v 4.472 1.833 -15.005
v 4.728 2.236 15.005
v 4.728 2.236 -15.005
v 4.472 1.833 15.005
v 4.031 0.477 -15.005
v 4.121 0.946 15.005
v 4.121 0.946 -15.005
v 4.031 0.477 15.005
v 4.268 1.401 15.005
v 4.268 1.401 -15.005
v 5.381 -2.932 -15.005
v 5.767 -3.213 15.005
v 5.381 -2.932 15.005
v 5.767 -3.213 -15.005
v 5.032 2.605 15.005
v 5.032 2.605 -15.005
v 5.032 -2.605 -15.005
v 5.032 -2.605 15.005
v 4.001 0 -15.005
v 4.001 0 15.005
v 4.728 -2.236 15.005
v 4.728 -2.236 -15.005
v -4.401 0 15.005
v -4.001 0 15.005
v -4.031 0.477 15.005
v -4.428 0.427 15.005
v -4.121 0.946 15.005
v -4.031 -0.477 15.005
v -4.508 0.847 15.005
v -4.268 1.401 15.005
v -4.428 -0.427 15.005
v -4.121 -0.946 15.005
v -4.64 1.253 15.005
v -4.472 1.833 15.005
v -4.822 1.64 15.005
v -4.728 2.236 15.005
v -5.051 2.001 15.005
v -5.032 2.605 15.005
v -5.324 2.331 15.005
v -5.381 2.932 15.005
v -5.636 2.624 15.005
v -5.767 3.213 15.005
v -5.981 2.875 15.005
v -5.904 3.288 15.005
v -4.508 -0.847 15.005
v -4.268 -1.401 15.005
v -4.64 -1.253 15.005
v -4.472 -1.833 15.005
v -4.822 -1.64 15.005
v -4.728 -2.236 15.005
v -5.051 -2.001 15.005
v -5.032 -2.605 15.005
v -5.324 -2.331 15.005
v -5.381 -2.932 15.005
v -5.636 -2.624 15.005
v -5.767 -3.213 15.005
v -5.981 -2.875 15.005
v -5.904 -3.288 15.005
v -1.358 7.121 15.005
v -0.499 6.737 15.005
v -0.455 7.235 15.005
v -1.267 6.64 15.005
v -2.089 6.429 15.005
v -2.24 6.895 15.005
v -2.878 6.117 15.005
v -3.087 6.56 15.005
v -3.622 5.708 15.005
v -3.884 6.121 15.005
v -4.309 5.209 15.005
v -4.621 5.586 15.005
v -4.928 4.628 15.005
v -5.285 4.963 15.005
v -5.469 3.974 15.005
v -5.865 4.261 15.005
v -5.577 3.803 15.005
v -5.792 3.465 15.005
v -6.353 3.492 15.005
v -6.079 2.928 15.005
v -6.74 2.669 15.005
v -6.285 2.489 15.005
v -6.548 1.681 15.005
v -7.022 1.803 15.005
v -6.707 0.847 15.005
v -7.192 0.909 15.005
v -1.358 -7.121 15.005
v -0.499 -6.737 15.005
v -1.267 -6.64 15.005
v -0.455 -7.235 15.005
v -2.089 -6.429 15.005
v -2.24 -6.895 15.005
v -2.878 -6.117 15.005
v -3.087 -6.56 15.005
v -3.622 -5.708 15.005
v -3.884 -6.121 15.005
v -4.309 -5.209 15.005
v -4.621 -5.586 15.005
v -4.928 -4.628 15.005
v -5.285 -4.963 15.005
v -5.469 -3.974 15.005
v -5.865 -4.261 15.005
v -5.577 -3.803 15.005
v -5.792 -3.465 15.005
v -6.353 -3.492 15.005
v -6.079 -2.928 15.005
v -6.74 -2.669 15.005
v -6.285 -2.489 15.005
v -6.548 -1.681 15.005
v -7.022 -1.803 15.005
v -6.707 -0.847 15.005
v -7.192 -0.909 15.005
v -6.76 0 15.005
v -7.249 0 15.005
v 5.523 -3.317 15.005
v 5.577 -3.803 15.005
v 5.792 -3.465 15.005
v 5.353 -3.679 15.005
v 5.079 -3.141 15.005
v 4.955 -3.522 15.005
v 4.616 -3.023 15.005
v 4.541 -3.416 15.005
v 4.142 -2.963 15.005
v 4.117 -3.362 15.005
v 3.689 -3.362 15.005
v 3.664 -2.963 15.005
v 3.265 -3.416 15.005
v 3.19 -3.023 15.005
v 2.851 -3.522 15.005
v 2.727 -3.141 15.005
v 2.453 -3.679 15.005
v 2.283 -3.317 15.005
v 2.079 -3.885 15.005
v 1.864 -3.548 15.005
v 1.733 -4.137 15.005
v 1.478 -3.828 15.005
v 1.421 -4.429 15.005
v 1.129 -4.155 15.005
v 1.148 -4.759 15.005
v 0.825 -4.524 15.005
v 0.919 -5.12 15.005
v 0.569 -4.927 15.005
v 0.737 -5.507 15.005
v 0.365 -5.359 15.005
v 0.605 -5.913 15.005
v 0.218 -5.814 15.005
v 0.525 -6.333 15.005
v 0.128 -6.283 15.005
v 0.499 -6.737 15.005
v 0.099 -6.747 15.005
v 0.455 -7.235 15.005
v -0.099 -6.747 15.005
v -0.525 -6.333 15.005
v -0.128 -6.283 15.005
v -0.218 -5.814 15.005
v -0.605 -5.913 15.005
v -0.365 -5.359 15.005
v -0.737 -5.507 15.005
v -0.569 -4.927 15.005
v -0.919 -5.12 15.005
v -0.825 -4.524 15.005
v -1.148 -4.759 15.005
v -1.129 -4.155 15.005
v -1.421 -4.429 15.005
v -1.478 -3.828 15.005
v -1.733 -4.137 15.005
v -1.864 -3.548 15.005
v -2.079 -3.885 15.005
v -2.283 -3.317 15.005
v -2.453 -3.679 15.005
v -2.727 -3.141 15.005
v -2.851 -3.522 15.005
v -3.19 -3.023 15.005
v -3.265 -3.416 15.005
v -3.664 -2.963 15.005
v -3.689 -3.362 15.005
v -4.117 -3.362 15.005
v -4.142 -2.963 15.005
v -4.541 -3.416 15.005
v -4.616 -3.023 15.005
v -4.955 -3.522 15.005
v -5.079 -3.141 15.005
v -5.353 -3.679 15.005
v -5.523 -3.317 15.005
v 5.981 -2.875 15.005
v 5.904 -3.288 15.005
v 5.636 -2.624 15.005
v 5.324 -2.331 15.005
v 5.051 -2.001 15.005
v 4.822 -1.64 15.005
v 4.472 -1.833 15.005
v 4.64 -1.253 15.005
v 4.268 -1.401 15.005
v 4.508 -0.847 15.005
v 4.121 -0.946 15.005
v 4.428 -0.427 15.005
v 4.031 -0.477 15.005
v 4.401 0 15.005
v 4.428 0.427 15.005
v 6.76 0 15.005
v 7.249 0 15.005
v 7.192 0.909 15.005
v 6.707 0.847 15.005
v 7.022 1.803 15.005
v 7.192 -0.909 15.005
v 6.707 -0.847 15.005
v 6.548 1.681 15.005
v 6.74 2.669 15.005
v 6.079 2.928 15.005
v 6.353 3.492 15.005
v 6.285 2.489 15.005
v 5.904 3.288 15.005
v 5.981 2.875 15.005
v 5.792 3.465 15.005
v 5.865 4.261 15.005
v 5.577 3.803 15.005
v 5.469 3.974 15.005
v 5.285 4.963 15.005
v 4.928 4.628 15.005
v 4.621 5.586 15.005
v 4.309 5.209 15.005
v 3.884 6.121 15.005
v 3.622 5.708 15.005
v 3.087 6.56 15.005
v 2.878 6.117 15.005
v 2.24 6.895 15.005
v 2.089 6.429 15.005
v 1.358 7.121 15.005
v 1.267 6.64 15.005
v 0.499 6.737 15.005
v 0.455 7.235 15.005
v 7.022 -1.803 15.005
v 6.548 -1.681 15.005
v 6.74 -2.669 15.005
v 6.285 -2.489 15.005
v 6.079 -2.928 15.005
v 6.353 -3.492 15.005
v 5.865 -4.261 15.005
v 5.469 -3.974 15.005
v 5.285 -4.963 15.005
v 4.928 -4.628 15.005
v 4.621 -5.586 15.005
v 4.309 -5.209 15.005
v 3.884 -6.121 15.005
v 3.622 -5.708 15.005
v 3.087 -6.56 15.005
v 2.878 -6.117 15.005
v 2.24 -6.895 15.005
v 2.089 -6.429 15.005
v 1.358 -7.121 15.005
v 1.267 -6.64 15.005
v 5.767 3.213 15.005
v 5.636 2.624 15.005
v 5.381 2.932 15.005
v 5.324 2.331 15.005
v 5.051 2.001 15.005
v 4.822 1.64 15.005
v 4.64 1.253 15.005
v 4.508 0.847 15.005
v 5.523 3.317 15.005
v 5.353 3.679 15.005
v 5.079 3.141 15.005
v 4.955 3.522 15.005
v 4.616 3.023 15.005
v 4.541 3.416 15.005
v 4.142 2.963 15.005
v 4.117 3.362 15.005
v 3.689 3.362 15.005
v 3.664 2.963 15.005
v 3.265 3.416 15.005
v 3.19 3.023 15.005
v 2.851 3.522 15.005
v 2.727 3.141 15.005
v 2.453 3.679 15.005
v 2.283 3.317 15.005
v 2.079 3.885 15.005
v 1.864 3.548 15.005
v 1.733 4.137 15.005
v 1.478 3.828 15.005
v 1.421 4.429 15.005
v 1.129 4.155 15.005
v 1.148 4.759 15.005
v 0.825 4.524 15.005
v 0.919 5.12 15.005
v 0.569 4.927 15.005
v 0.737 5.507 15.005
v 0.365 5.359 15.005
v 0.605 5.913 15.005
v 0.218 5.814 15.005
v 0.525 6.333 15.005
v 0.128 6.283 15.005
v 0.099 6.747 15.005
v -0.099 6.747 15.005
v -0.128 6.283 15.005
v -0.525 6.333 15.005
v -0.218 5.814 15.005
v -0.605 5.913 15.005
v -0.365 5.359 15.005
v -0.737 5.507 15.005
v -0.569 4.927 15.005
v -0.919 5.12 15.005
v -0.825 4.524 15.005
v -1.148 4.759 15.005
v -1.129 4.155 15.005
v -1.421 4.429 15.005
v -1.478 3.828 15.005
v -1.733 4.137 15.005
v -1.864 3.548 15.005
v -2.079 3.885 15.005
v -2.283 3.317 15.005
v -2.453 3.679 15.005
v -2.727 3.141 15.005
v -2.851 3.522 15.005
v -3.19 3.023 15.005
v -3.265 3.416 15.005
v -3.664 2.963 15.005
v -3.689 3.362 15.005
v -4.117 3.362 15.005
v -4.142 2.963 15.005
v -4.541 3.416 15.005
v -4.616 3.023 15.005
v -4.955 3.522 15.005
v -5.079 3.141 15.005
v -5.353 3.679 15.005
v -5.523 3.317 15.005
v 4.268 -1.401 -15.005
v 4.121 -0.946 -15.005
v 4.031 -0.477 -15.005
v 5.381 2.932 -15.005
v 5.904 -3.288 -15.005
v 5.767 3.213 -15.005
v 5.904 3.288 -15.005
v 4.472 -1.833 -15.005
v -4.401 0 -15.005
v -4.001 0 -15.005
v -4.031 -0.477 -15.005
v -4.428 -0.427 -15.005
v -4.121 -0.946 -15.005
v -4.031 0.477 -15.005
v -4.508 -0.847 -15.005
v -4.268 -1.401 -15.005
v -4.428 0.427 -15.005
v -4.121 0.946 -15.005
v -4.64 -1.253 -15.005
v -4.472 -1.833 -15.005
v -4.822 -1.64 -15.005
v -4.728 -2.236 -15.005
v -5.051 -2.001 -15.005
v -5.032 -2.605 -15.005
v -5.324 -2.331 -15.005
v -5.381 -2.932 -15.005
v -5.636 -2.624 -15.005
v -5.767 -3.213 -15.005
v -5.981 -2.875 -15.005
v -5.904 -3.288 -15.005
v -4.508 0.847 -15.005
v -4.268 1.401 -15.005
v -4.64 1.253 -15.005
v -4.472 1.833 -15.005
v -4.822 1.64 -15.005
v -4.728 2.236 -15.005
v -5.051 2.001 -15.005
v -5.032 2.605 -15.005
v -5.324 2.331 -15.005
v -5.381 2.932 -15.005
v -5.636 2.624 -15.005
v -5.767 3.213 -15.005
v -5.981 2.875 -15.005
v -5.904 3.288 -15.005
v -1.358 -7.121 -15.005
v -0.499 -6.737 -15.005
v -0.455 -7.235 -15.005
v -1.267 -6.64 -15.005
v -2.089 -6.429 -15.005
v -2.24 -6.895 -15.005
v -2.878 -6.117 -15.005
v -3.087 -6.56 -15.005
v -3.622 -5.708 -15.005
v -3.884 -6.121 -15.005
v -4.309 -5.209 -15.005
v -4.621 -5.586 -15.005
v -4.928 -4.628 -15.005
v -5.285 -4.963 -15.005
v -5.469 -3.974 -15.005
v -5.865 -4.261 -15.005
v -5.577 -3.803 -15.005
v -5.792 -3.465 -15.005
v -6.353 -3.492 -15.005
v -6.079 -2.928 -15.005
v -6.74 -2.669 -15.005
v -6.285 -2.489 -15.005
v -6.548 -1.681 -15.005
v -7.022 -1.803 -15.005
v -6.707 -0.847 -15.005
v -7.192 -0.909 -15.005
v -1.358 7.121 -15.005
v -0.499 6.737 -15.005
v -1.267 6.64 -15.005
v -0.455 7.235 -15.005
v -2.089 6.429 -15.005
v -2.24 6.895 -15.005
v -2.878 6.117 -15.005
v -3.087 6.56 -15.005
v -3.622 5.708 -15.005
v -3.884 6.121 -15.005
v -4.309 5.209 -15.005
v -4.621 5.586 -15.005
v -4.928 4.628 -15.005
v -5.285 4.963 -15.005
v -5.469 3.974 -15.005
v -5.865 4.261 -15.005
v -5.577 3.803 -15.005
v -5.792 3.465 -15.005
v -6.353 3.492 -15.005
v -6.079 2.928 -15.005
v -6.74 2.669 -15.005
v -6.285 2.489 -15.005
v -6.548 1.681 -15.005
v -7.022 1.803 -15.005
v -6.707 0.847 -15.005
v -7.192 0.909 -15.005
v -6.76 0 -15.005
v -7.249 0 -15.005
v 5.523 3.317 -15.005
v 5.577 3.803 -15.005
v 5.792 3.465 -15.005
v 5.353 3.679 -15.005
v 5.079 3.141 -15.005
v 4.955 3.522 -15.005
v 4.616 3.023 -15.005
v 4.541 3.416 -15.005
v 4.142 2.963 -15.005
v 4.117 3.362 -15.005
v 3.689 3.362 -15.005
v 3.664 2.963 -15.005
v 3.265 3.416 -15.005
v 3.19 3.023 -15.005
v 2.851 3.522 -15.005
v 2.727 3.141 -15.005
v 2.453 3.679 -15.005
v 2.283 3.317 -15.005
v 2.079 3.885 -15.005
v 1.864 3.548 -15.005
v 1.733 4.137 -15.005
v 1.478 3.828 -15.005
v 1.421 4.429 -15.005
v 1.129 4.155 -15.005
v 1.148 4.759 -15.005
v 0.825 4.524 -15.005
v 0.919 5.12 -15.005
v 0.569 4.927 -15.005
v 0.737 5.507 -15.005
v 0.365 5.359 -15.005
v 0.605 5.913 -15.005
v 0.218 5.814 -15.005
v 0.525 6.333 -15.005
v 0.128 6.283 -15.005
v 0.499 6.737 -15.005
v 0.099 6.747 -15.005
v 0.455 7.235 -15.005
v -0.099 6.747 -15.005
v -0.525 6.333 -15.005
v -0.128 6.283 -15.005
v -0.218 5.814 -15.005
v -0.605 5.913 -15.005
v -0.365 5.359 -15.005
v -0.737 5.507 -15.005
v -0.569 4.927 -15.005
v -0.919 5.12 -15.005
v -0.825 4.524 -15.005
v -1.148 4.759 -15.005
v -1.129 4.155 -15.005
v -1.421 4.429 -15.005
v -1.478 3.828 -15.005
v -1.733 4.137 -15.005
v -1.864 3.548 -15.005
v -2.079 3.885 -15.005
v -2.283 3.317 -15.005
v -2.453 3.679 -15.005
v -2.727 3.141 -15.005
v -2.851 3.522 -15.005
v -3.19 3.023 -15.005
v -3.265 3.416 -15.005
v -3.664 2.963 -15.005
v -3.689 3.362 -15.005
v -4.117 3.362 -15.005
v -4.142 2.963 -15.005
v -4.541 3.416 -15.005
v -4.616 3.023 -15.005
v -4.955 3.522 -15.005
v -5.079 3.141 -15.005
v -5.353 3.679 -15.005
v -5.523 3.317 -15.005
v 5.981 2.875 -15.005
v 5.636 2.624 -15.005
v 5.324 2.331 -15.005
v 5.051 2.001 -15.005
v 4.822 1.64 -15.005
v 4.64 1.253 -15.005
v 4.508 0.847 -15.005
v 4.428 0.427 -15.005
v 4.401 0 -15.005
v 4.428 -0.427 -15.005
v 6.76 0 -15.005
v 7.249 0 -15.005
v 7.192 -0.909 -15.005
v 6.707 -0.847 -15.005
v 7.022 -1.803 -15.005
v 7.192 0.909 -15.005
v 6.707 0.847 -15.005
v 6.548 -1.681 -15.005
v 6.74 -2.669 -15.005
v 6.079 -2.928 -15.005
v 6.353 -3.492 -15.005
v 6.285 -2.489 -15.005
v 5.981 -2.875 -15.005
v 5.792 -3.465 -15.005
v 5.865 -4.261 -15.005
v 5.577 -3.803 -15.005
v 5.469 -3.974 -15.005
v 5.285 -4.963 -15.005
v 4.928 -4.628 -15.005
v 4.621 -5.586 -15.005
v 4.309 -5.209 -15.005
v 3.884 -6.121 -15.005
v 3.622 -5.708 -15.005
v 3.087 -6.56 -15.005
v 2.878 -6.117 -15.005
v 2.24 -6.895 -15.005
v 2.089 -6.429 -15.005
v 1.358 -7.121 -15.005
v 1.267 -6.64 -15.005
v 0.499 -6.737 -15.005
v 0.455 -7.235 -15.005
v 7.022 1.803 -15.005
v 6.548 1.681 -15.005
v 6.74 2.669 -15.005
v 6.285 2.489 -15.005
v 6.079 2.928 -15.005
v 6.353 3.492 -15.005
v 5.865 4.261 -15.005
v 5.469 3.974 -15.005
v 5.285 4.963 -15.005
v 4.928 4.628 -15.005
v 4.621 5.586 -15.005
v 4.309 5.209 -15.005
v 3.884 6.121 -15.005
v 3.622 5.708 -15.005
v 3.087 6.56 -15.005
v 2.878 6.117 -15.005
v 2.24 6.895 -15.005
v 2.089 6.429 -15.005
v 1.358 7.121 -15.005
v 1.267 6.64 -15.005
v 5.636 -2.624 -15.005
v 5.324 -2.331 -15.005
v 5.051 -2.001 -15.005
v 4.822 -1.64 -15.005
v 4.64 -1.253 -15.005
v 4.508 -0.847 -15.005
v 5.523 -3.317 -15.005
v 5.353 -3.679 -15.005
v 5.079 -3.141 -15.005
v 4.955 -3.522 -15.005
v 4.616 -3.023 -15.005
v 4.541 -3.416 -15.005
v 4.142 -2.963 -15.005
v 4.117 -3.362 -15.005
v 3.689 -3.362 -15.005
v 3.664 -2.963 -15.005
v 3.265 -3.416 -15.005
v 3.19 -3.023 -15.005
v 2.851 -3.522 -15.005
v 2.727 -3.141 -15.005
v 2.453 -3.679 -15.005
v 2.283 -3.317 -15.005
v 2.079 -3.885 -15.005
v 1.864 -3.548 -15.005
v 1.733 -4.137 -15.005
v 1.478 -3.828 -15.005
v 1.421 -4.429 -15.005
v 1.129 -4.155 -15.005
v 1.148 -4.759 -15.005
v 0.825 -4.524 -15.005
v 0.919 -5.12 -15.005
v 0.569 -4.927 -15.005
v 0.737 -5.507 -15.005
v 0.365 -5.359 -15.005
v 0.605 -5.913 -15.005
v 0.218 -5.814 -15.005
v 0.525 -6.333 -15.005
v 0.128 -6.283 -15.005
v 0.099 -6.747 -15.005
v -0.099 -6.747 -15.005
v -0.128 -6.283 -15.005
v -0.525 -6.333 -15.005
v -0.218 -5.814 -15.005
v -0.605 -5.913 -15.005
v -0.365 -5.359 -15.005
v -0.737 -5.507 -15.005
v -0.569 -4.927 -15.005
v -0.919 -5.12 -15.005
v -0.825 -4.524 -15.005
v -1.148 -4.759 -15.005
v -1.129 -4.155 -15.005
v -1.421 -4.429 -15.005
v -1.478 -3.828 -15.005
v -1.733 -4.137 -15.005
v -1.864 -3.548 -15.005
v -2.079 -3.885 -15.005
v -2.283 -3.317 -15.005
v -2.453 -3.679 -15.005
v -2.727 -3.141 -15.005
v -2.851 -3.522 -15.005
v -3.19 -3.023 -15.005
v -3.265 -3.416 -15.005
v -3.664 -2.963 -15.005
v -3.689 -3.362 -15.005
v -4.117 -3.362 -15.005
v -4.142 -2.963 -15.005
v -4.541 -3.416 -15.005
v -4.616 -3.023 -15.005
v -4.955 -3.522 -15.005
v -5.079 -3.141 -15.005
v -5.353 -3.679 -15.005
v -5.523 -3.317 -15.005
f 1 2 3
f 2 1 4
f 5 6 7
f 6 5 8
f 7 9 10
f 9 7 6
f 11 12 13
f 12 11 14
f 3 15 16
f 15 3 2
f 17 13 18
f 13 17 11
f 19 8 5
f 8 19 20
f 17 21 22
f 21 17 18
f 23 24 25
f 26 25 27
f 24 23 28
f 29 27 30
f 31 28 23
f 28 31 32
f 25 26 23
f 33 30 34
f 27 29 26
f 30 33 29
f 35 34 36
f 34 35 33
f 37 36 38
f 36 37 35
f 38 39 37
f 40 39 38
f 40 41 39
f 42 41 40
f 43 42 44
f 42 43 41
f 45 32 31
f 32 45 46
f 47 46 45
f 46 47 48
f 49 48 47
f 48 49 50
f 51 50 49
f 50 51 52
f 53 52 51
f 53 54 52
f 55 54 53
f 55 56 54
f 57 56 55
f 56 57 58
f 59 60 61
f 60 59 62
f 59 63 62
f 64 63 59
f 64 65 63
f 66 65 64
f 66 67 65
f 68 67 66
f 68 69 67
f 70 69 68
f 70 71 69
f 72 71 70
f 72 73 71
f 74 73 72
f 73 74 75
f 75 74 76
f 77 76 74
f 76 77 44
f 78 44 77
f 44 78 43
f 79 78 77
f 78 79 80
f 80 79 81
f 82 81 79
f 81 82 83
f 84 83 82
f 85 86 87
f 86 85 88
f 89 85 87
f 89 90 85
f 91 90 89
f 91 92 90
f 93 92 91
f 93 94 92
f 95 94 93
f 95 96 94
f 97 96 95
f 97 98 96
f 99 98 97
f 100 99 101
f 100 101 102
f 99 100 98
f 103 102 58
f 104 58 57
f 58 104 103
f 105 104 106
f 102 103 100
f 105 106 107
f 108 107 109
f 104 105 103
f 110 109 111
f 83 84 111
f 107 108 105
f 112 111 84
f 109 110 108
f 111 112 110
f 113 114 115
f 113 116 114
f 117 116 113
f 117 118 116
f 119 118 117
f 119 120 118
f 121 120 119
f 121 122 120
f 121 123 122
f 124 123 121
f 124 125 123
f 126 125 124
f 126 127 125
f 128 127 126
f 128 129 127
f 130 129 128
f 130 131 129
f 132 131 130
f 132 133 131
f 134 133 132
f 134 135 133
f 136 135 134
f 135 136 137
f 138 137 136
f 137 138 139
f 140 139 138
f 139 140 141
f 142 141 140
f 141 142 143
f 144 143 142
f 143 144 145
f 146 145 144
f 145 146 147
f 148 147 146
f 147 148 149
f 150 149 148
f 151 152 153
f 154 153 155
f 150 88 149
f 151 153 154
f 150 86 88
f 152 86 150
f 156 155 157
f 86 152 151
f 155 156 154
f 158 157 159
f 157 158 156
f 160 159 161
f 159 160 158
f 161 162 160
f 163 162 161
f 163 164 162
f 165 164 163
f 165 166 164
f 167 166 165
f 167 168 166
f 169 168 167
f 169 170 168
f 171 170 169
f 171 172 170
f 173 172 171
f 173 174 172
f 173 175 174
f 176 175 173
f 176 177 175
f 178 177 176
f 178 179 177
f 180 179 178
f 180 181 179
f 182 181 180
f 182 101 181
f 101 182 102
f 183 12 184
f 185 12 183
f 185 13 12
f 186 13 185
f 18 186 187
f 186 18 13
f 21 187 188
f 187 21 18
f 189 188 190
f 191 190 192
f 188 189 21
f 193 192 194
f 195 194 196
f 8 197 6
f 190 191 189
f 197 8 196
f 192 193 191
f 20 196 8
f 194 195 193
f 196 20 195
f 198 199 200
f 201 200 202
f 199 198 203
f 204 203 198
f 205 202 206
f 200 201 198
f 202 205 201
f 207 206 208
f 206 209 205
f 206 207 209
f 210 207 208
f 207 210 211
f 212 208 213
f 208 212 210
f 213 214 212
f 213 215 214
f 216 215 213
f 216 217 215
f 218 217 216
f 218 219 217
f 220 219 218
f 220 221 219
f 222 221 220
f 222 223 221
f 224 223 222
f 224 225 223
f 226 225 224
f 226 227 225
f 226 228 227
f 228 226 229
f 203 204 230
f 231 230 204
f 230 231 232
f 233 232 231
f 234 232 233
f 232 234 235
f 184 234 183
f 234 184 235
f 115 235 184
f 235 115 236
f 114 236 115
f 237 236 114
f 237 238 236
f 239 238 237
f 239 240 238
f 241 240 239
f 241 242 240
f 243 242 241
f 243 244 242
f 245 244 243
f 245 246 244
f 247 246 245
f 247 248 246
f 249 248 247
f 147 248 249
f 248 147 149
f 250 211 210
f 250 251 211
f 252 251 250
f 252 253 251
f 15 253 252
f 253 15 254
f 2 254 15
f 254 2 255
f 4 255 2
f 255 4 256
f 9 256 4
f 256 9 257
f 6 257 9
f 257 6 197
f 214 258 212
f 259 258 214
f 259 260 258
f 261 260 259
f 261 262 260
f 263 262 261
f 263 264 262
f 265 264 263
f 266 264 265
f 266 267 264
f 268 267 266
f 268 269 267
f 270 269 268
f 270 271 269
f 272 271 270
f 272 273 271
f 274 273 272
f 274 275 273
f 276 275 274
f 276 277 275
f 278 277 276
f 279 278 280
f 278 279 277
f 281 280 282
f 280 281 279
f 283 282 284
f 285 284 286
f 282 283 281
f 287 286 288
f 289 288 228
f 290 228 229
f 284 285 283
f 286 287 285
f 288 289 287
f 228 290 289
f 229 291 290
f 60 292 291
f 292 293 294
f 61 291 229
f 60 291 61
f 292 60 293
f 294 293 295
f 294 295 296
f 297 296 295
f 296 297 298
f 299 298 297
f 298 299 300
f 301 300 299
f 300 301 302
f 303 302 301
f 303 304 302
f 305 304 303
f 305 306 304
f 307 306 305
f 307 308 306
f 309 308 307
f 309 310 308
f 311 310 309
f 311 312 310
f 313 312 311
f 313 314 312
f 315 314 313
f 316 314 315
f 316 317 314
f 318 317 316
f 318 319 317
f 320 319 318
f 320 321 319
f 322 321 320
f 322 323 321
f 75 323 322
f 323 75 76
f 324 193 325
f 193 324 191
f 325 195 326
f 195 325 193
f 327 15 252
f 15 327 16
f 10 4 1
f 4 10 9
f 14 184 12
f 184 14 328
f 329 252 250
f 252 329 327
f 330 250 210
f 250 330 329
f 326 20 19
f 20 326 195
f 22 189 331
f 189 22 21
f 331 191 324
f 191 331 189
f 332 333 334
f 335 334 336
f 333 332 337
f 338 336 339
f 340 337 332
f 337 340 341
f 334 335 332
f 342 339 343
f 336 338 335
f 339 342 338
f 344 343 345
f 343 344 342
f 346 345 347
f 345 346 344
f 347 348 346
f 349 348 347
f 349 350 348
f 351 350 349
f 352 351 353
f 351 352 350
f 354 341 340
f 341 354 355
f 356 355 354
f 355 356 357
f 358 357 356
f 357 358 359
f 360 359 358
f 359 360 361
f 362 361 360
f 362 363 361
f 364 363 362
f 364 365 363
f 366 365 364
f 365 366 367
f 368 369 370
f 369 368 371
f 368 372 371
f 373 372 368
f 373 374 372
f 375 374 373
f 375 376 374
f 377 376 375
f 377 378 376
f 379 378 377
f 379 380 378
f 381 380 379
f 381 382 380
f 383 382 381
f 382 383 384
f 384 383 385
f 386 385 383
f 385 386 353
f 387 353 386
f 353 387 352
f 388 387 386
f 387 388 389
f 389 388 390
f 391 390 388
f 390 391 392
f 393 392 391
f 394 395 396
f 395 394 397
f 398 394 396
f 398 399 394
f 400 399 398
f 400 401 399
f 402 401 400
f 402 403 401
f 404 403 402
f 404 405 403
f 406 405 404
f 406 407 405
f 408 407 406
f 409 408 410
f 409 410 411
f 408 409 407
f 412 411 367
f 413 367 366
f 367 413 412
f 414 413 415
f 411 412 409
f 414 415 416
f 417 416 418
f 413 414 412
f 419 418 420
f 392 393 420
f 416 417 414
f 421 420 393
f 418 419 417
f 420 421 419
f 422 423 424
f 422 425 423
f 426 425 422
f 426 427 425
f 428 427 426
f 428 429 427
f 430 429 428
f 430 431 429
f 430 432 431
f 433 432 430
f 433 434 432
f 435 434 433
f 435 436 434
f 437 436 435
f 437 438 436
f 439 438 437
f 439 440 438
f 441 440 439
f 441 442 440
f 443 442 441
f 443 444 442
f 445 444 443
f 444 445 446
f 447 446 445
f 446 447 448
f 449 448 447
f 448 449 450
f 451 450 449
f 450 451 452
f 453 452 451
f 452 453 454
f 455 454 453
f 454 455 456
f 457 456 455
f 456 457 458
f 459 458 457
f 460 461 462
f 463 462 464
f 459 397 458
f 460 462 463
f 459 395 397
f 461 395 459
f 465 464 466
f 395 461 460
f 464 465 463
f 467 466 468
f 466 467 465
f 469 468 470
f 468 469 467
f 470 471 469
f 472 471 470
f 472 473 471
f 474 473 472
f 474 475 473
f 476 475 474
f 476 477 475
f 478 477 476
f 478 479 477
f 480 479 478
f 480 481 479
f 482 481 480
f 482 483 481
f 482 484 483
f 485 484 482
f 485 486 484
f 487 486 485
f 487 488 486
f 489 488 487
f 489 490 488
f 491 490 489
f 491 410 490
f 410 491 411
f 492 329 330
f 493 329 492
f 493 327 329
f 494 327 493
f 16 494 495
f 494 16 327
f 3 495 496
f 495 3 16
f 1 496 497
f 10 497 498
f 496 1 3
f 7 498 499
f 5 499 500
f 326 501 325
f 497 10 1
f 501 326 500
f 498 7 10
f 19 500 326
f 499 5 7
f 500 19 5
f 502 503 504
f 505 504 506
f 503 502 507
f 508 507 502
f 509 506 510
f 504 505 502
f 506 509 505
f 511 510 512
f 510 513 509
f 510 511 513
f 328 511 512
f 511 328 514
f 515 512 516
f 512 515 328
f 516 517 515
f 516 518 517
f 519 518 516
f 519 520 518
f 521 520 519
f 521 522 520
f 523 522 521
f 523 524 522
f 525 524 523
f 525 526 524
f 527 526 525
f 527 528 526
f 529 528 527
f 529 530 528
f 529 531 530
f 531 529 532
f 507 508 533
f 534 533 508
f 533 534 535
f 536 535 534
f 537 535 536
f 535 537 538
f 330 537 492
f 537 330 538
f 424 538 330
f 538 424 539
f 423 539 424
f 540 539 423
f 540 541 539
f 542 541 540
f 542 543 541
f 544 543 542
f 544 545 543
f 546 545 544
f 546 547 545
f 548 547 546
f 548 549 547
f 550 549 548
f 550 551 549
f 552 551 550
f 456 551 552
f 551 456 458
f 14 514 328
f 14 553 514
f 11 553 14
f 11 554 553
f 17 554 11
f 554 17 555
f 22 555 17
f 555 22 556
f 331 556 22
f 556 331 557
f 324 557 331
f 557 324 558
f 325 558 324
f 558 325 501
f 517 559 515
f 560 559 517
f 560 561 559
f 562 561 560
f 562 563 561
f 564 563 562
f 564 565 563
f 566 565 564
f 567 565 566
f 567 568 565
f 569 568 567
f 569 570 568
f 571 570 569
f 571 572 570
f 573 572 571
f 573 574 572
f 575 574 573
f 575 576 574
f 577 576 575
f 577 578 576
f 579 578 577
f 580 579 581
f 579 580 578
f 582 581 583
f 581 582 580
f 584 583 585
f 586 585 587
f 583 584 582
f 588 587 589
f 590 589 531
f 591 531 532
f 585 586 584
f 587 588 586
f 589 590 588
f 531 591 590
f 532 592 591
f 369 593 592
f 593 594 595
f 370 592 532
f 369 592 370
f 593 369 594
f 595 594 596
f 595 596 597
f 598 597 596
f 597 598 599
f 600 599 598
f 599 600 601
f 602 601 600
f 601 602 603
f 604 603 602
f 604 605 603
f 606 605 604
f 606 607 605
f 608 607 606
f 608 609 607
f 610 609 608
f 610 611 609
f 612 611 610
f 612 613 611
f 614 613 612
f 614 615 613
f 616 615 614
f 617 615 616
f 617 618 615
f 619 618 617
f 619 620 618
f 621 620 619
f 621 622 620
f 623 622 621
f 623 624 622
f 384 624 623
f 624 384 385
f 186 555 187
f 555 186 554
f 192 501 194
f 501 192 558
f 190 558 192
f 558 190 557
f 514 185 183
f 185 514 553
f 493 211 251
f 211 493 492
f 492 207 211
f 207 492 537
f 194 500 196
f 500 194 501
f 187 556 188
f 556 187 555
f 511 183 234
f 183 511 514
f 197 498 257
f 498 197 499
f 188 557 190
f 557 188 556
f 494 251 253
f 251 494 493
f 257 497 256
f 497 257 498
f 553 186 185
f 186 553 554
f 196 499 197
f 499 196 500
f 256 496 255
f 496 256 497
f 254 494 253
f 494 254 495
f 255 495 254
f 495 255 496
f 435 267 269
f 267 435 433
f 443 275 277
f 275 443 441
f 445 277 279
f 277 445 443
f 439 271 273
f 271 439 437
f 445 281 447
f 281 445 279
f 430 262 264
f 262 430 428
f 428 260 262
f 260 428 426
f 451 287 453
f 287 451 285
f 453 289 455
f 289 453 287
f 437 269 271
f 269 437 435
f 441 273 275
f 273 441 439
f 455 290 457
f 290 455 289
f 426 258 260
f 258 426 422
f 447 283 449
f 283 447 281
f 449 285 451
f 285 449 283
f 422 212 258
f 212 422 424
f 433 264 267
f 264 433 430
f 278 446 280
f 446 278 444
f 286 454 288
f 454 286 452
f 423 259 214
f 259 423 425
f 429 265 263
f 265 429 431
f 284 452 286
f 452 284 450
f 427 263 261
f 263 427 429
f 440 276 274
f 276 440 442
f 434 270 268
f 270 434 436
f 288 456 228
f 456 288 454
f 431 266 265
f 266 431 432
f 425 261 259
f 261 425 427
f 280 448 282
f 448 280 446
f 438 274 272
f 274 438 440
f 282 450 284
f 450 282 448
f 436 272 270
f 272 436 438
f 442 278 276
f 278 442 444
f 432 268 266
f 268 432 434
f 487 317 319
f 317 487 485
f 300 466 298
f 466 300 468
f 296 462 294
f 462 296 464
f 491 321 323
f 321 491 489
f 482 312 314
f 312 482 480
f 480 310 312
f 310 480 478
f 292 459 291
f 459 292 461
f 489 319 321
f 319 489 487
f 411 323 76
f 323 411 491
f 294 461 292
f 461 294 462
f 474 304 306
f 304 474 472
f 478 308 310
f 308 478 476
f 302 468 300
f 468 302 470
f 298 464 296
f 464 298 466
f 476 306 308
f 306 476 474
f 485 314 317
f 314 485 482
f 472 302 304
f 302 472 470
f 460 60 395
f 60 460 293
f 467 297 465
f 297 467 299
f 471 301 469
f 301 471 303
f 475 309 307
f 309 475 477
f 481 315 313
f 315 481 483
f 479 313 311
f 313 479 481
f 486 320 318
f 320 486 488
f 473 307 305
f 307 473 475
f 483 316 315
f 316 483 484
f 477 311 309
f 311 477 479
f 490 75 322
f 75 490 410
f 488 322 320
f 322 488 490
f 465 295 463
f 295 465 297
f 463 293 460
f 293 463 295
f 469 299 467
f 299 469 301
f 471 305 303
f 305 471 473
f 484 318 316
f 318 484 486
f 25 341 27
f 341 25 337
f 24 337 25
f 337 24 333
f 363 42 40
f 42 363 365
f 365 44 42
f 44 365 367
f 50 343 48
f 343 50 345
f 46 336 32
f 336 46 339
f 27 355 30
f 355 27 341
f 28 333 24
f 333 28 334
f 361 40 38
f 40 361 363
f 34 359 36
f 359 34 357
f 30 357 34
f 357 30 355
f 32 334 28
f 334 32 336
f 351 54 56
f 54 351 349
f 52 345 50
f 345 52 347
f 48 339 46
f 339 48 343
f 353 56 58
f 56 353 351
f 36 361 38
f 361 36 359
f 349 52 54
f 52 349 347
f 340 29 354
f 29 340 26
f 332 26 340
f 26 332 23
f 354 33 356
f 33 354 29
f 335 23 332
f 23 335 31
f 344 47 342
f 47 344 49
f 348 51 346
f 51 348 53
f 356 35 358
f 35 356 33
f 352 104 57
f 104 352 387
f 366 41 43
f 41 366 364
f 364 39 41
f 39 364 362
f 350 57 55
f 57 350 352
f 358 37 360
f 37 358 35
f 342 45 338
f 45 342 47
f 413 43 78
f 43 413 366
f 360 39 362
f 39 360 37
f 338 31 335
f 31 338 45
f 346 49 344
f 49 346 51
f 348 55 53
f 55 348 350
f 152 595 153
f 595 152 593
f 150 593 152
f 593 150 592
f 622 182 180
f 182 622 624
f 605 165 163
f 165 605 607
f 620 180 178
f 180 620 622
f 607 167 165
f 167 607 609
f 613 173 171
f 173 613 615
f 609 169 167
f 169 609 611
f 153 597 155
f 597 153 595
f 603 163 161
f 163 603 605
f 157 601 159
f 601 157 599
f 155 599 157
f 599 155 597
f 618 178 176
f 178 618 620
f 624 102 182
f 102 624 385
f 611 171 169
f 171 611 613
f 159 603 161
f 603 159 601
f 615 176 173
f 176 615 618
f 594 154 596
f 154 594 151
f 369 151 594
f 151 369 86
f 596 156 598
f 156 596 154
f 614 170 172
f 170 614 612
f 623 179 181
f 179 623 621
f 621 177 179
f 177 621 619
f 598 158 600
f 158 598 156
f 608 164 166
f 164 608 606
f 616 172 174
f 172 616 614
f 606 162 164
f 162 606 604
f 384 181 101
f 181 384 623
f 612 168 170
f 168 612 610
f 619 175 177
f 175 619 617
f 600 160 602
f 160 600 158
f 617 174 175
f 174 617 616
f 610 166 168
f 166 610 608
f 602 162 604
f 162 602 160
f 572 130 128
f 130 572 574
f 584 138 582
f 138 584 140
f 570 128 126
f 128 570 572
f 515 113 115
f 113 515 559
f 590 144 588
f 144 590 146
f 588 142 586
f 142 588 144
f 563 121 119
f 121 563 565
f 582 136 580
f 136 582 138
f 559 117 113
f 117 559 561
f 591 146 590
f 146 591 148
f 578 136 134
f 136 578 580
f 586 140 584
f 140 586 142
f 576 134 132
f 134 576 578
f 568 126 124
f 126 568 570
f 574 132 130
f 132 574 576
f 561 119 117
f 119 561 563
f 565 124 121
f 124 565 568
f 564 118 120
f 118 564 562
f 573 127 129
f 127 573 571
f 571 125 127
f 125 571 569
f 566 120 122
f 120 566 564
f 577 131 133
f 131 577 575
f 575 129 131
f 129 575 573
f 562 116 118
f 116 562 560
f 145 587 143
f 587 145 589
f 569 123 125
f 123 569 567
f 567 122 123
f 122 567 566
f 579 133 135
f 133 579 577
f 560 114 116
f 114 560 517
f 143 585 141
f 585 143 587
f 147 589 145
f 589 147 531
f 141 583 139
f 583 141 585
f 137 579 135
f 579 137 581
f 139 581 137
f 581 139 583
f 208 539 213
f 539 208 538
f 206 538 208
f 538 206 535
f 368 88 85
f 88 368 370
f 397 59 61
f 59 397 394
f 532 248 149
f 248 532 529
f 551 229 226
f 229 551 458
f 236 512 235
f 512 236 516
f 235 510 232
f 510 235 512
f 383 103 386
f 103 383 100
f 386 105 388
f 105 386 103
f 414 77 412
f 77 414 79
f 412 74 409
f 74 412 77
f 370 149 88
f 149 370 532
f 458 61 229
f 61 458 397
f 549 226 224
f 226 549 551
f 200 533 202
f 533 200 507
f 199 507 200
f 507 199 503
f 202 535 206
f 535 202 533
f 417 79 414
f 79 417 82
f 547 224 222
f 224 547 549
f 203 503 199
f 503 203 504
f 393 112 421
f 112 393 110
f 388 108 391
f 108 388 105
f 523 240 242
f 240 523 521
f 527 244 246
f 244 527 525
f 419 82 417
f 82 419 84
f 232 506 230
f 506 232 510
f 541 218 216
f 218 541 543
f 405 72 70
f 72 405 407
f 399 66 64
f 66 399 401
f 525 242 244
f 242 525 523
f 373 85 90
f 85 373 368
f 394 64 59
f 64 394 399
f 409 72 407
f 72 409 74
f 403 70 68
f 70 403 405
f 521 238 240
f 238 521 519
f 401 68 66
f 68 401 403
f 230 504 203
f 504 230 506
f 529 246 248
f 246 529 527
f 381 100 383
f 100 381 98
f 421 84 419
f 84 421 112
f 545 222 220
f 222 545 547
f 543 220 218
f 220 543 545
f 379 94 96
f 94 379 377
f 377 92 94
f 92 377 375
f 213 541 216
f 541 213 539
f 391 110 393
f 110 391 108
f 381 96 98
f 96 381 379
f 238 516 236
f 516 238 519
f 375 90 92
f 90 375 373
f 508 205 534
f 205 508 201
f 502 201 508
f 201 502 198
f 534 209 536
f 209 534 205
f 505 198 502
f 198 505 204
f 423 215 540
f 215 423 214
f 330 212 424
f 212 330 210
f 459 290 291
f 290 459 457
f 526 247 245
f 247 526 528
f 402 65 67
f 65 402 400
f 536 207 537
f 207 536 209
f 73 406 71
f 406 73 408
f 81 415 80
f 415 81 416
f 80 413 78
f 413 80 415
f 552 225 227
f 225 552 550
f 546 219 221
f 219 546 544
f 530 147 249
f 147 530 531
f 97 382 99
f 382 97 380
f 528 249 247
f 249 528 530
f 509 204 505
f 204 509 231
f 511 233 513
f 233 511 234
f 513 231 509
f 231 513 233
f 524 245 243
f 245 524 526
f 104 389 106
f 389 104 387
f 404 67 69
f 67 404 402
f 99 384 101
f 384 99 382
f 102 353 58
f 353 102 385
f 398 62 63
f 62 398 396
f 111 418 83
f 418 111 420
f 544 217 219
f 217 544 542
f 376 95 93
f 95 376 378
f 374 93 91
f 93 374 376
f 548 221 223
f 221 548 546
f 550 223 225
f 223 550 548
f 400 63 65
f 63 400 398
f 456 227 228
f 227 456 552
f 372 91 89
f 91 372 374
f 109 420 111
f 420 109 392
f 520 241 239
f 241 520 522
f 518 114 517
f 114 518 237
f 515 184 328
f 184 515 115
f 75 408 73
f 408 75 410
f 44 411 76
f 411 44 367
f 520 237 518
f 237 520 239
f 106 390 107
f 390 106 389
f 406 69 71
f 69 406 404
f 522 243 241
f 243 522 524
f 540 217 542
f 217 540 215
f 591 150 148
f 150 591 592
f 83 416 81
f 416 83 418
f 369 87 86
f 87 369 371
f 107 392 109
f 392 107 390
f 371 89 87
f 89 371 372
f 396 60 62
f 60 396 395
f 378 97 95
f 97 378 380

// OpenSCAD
// Inner diameter of the bearing
inner_diameter = 8.001;
// Outer diameter of the bearing
outer_diameter = 14.499;
// Lenght of the bearing
length = 30.01;

/*[Advanced]*/
// How round should the circles be
resolution = 50;

// Number of nodules around interior of bearing
num_nodules = 6;
// The ratio of nodule diamter to inner diameter
nod_ratio = 0.951;

// Tolerance on the inner diameter 
tolerance = 0.001;

ID = inner_diameter + tolerance;
OD = outer_diameter;
res = resolution;
numNod = num_nodules;
nodRat = nod_ratio;
_rad=ID*(.5+(nodRat*.5));



union(){
    intersection(){
        for(i = [0 : 360/numNod : 390*(1-(1/numNod))]){
            translate([cos(i)*_rad, sin(i)*_rad, 0])
                difference(){
                    cylinder(h=length,d=ID*nodRat,center=true,$fn=res);
                    cylinder(h=length+1,d=ID*nodRat-.8,center=true,$fn=res);
                }
        }
        cylinder(h=length,d=OD,center=true,$fn=res);
    }
    difference(){
        cylinder(h=length,d=OD,center=true,$fn=res);
        cylinder(h=length+1,r=(_rad/2)*sqrt(3),center=true,$fn=res);
    }
}
